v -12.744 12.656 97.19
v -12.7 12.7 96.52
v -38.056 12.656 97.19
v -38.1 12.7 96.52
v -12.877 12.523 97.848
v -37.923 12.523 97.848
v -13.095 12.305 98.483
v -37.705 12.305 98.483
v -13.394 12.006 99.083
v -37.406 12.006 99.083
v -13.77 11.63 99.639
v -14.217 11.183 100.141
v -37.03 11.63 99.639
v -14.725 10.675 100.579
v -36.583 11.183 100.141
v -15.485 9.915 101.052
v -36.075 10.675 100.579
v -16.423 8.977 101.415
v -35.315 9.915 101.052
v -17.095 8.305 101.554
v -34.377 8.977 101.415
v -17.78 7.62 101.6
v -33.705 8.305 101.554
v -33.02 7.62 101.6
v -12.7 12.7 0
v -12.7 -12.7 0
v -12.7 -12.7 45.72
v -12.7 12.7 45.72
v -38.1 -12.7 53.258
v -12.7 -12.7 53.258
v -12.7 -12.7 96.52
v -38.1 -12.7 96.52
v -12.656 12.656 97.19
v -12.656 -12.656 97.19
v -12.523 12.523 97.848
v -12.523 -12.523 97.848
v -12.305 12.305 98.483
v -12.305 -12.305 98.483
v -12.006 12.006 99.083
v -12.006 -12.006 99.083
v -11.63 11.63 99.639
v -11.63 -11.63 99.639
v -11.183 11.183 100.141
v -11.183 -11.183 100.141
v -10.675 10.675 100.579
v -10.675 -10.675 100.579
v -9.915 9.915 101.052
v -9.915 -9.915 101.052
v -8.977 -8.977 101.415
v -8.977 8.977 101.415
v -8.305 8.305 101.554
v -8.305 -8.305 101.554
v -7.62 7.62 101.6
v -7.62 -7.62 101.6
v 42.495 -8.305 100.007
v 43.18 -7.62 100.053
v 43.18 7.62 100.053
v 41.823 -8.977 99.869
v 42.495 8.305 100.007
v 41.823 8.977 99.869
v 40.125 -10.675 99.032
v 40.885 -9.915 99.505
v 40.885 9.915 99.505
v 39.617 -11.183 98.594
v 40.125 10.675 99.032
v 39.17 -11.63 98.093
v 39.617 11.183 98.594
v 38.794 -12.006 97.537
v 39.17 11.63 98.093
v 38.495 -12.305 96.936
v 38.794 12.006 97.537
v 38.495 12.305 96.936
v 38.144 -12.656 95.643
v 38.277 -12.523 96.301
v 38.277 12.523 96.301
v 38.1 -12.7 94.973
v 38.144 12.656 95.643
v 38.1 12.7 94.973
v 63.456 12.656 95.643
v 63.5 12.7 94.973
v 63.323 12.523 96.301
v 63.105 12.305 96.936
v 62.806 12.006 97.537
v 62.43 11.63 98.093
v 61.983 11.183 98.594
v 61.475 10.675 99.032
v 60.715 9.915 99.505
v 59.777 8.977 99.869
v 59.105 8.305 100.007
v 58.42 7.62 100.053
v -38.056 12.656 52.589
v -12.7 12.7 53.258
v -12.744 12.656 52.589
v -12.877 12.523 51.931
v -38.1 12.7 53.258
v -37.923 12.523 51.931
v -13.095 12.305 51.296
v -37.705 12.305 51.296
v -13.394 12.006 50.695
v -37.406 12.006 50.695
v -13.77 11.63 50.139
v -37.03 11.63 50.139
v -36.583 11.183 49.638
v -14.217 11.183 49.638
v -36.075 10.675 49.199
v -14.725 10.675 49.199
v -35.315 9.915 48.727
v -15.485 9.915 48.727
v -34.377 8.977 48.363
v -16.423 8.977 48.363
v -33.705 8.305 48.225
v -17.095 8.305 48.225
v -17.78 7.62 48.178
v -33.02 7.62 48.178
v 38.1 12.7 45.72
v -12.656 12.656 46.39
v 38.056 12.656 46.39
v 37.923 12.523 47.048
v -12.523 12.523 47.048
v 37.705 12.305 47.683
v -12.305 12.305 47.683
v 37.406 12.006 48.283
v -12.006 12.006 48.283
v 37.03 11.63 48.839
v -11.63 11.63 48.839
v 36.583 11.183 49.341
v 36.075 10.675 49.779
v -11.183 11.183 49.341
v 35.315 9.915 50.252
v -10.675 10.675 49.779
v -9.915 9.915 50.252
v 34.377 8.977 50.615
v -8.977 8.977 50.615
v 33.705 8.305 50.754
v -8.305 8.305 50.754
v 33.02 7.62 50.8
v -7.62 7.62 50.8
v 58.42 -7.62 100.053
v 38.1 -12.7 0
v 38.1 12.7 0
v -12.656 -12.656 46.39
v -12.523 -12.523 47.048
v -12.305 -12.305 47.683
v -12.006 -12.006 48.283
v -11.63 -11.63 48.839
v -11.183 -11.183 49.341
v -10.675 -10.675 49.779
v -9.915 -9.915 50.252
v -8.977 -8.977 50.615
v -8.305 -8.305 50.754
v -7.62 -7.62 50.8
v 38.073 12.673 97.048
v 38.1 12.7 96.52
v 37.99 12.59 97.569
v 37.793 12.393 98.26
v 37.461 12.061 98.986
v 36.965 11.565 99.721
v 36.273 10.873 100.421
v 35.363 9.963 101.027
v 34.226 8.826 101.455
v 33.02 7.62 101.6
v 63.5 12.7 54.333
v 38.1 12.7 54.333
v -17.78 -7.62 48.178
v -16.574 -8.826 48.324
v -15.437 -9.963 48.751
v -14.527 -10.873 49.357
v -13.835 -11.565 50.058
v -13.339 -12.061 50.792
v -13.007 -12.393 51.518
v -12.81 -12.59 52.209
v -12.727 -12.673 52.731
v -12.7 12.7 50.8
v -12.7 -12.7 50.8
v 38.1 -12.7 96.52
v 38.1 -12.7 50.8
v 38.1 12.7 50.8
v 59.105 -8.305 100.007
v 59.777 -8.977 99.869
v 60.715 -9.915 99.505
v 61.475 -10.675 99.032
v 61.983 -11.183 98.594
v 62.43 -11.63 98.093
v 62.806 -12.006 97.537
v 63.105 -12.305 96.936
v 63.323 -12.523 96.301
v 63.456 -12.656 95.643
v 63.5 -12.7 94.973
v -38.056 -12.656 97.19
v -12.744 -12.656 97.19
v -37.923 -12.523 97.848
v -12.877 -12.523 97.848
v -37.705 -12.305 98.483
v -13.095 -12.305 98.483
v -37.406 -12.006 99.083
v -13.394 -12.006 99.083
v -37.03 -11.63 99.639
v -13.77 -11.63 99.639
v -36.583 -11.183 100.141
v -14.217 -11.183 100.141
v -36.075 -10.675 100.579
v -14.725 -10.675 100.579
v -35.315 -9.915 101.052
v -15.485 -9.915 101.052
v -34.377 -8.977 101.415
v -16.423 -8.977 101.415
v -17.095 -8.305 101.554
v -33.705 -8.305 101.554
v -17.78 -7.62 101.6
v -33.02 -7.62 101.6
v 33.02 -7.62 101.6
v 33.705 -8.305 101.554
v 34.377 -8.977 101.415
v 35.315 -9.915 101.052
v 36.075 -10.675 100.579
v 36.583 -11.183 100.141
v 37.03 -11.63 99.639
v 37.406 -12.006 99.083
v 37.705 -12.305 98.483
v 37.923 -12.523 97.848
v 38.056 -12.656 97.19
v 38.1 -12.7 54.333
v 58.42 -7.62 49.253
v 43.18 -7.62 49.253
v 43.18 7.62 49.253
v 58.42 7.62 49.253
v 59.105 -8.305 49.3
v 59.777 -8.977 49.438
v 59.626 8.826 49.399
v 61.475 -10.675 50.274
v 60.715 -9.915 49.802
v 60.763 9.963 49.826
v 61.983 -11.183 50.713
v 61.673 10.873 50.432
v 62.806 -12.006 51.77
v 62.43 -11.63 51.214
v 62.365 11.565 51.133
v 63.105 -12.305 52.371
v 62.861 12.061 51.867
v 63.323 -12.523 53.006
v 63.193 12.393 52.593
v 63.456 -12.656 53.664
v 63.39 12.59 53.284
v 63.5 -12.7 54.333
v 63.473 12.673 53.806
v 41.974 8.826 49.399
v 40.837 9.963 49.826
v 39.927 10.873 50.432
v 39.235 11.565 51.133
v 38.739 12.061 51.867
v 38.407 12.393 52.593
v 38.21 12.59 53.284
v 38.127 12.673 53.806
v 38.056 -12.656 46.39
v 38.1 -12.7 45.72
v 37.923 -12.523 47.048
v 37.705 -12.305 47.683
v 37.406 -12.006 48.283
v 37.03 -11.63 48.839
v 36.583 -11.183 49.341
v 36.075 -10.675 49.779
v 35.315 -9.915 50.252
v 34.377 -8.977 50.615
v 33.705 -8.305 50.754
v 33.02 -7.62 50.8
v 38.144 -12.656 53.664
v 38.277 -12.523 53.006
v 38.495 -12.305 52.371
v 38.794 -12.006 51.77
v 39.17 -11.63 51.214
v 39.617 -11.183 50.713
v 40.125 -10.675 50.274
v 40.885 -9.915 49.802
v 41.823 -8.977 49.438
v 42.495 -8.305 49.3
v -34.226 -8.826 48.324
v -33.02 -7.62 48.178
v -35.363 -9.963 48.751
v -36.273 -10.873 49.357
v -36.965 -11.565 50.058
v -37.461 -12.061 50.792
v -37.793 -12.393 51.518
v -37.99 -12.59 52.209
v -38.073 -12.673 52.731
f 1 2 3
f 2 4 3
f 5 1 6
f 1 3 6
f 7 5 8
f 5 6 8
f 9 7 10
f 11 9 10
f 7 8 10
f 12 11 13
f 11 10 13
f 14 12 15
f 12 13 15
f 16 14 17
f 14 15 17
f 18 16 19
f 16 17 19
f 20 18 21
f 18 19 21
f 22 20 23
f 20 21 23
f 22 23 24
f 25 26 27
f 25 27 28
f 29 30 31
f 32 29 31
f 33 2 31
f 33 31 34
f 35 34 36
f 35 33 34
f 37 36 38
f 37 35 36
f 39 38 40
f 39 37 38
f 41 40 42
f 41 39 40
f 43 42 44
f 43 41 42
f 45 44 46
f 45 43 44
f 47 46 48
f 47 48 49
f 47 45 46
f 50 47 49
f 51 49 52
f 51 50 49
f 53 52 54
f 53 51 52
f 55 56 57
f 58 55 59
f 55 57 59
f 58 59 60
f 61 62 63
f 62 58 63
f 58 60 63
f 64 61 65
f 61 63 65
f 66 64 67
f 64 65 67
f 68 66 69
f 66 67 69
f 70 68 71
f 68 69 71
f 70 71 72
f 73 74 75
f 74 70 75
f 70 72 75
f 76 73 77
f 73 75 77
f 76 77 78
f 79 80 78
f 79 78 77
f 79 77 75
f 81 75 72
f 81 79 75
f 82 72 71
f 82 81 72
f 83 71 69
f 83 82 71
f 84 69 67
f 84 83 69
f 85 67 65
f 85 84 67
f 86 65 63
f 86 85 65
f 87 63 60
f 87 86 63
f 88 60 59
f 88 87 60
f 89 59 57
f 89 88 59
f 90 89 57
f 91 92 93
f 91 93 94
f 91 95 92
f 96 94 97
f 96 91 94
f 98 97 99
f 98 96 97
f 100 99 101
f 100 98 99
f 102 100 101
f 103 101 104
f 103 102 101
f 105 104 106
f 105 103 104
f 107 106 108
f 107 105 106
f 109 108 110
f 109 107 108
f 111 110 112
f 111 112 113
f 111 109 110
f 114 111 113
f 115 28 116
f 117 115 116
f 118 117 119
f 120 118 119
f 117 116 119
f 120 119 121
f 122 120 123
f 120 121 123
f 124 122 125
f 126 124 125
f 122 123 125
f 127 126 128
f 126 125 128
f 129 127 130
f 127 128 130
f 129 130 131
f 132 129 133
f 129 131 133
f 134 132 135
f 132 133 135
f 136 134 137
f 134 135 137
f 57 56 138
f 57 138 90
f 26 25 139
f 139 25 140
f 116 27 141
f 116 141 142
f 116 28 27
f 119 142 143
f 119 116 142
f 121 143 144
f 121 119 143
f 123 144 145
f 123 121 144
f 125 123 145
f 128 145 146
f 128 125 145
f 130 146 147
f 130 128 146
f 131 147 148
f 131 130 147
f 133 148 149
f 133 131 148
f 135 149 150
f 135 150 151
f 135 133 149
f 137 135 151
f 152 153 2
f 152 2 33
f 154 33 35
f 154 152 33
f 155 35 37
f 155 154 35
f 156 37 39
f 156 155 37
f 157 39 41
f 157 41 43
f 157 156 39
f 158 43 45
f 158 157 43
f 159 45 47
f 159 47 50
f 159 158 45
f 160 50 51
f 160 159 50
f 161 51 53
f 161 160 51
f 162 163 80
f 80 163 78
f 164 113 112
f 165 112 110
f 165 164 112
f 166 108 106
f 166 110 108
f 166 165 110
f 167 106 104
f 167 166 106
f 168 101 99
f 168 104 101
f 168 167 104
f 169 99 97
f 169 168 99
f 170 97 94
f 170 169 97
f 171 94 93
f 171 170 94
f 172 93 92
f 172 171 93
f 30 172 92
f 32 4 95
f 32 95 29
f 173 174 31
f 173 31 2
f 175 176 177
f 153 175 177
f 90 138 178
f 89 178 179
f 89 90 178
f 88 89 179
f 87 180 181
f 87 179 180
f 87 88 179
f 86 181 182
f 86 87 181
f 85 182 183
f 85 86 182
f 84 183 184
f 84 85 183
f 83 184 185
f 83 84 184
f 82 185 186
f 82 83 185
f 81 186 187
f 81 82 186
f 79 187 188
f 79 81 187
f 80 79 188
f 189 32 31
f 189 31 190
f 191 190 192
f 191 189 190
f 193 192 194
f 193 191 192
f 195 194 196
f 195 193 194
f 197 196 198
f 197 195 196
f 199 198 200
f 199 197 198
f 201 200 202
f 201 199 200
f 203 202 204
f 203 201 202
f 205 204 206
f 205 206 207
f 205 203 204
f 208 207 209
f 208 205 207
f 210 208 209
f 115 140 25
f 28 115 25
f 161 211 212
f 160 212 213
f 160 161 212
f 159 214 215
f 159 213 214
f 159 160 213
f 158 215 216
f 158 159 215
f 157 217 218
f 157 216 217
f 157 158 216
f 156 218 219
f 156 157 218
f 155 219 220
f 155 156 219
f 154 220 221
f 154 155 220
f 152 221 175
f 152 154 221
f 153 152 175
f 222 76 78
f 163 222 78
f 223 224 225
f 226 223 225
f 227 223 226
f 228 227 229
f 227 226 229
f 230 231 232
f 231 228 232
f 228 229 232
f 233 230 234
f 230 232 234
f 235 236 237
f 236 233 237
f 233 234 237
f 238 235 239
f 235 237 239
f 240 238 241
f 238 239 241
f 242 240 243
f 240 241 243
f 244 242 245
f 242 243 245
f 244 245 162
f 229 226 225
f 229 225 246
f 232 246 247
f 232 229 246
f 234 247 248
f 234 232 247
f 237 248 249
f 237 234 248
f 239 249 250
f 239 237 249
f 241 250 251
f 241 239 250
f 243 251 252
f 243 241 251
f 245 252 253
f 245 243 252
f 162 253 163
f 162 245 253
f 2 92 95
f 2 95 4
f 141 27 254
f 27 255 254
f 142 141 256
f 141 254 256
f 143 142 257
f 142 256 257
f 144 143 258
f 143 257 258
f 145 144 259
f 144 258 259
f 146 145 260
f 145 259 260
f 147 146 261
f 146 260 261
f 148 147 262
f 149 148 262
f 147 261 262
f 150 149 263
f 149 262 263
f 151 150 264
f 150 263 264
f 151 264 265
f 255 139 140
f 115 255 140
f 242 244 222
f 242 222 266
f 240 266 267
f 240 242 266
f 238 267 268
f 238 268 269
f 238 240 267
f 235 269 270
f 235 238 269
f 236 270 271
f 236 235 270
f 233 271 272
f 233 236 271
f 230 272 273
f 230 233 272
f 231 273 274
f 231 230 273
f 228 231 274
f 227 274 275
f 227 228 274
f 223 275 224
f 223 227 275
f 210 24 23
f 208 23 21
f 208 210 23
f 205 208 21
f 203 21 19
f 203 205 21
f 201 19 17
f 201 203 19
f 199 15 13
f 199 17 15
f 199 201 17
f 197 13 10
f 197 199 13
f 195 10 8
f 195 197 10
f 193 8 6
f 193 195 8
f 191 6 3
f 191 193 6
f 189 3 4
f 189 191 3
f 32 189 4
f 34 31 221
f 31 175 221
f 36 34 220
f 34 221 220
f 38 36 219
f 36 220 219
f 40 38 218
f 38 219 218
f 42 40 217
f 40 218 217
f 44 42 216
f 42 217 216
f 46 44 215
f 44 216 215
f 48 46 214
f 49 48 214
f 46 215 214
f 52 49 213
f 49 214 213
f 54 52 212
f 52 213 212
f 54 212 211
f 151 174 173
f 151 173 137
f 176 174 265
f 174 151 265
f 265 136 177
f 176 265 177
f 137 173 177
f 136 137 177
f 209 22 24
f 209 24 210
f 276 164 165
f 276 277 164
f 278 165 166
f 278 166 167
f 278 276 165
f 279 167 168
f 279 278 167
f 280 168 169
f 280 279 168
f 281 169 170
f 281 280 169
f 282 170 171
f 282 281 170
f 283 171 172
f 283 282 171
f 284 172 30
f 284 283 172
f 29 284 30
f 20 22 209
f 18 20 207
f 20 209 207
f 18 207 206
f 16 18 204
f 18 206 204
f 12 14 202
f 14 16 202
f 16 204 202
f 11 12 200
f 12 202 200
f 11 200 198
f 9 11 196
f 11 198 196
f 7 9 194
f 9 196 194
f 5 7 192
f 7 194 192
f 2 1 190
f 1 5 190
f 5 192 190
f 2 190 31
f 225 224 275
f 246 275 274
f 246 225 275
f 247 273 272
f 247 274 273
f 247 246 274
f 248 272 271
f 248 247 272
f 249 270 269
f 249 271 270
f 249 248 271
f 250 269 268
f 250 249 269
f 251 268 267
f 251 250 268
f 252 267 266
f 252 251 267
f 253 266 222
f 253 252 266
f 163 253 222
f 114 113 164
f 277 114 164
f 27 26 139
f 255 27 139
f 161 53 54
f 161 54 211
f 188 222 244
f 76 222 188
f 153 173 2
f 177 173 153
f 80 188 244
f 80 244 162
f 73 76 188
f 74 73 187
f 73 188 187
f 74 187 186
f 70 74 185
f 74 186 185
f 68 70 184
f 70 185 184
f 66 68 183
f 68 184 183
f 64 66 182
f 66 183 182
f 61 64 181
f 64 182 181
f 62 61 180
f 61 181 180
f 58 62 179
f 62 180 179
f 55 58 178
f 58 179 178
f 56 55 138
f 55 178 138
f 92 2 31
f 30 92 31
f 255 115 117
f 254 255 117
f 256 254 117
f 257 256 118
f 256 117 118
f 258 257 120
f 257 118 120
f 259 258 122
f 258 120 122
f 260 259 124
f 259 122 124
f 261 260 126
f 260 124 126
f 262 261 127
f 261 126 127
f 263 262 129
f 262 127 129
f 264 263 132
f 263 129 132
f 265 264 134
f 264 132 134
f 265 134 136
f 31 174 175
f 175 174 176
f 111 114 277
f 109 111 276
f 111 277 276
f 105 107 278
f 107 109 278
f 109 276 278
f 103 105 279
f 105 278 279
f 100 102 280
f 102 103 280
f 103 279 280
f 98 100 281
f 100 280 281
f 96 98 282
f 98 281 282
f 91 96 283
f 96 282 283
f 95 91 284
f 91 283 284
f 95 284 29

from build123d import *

# Parameters (mm, degrees)
F0_W     = 25.4
F0_H     = 25.4
F1_DEPTH = 50.8
F2_R     = 5.08
F3_W     = 50.8
F3_H     = 25.4
F4_DEPTH = 50.8
F5_W     = 25.4
F5_H     = 53.4215743065
F6_DEPTH = 25.4
F8_W     = 25.4
F8_H     = 50.8
F9_DEPTH = 25.4
F10_R    = 5.08
F10_2_R  = 5.08
F10_3_R  = 5.08


with BuildPart() as f1:
    # F0 (on Top) → F1 (new body)
    with BuildSketch(Plane.XY):
        Rectangle(F0_W, F0_H)
        with Locations((25.4, 0)):
            Rectangle(F0_W, F0_H)
    extrude(amount=F1_DEPTH)

    # F2
    f2_edges = [f1.edges().sort_by_distance(p)[0] for p in [
        (-12.7, 0, 50.8),
        (12.7, -12.7, 50.8),
        (38.1, 0, 50.8),
        (12.7, 12.7, 50.8),
    ]]
    fillet(f2_edges, radius=F2_R)

    # F3 (on face) → F4 (join)
    with BuildSketch(Plane.XY.offset(50.8)):
        with Locations((12.7, 0)):
            Rectangle(F3_W, F3_H)
    extrude(amount=F4_DEPTH)

    # F10#2
    f10_2_edges = [f1.edges().sort_by_distance(p)[0] for p in [
        (-12.7, 0, 101.6),
        (12.7, -12.7, 101.6),
        (38.1, 0, 101.6),
        (12.7, 12.7, 101.6),
    ]]
    fillet(f10_2_edges, radius=F10_2_R)


with BuildPart() as f6:
    # F5 (on face) → F6 (new body)
    with BuildSketch(Plane(origin=(-12.7, 0, 0), x_dir=(0, -1, 0), z_dir=(-1, 0, 0))):
        with Locations((0, 74.8892128468)):
            Rectangle(F5_W, F5_H)
    extrude(amount=F6_DEPTH)

    # F10
    f10_edges = [f6.edges().sort_by_distance(p)[0] for p in [
        (-25.4, -12.7, 101.6),
        (-25.4, 12.7, 101.6),
        (-12.7, 0, 101.6),
        (-38.1, 0, 101.6),
        (-25.4, 12.7, 48.178426),
        (-25.4, -12.7, 48.178426),
        (-12.7, 0, 48.178426),
        (-38.1, 0, 48.178426),
    ]]
    fillet(f10_edges, radius=F10_R)


with BuildPart() as f9:
    # F8 (on face) → F9 (new body)
    with BuildSketch(Plane.YZ.offset(38.1)):
        with Locations((0, 74.6534094214)):
            Rectangle(F8_W, F8_H)
    extrude(amount=F9_DEPTH)

    # F10#3
    f10_3_edges = [f9.edges().sort_by_distance(p)[0] for p in [
        (50.8, 12.7, 100.053409),
        (50.8, -12.7, 100.053409),
        (38.1, 0, 100.053409),
        (63.5, 0, 100.053409),
        (50.8, -12.7, 49.253409),
        (50.8, 12.7, 49.253409),
        (38.1, 0, 49.253409),
        (63.5, 0, 49.253409),
    ]]
    fillet(f10_3_edges, radius=F10_3_R)


solid = Compound([f1.part, f6.part, f9.part])
